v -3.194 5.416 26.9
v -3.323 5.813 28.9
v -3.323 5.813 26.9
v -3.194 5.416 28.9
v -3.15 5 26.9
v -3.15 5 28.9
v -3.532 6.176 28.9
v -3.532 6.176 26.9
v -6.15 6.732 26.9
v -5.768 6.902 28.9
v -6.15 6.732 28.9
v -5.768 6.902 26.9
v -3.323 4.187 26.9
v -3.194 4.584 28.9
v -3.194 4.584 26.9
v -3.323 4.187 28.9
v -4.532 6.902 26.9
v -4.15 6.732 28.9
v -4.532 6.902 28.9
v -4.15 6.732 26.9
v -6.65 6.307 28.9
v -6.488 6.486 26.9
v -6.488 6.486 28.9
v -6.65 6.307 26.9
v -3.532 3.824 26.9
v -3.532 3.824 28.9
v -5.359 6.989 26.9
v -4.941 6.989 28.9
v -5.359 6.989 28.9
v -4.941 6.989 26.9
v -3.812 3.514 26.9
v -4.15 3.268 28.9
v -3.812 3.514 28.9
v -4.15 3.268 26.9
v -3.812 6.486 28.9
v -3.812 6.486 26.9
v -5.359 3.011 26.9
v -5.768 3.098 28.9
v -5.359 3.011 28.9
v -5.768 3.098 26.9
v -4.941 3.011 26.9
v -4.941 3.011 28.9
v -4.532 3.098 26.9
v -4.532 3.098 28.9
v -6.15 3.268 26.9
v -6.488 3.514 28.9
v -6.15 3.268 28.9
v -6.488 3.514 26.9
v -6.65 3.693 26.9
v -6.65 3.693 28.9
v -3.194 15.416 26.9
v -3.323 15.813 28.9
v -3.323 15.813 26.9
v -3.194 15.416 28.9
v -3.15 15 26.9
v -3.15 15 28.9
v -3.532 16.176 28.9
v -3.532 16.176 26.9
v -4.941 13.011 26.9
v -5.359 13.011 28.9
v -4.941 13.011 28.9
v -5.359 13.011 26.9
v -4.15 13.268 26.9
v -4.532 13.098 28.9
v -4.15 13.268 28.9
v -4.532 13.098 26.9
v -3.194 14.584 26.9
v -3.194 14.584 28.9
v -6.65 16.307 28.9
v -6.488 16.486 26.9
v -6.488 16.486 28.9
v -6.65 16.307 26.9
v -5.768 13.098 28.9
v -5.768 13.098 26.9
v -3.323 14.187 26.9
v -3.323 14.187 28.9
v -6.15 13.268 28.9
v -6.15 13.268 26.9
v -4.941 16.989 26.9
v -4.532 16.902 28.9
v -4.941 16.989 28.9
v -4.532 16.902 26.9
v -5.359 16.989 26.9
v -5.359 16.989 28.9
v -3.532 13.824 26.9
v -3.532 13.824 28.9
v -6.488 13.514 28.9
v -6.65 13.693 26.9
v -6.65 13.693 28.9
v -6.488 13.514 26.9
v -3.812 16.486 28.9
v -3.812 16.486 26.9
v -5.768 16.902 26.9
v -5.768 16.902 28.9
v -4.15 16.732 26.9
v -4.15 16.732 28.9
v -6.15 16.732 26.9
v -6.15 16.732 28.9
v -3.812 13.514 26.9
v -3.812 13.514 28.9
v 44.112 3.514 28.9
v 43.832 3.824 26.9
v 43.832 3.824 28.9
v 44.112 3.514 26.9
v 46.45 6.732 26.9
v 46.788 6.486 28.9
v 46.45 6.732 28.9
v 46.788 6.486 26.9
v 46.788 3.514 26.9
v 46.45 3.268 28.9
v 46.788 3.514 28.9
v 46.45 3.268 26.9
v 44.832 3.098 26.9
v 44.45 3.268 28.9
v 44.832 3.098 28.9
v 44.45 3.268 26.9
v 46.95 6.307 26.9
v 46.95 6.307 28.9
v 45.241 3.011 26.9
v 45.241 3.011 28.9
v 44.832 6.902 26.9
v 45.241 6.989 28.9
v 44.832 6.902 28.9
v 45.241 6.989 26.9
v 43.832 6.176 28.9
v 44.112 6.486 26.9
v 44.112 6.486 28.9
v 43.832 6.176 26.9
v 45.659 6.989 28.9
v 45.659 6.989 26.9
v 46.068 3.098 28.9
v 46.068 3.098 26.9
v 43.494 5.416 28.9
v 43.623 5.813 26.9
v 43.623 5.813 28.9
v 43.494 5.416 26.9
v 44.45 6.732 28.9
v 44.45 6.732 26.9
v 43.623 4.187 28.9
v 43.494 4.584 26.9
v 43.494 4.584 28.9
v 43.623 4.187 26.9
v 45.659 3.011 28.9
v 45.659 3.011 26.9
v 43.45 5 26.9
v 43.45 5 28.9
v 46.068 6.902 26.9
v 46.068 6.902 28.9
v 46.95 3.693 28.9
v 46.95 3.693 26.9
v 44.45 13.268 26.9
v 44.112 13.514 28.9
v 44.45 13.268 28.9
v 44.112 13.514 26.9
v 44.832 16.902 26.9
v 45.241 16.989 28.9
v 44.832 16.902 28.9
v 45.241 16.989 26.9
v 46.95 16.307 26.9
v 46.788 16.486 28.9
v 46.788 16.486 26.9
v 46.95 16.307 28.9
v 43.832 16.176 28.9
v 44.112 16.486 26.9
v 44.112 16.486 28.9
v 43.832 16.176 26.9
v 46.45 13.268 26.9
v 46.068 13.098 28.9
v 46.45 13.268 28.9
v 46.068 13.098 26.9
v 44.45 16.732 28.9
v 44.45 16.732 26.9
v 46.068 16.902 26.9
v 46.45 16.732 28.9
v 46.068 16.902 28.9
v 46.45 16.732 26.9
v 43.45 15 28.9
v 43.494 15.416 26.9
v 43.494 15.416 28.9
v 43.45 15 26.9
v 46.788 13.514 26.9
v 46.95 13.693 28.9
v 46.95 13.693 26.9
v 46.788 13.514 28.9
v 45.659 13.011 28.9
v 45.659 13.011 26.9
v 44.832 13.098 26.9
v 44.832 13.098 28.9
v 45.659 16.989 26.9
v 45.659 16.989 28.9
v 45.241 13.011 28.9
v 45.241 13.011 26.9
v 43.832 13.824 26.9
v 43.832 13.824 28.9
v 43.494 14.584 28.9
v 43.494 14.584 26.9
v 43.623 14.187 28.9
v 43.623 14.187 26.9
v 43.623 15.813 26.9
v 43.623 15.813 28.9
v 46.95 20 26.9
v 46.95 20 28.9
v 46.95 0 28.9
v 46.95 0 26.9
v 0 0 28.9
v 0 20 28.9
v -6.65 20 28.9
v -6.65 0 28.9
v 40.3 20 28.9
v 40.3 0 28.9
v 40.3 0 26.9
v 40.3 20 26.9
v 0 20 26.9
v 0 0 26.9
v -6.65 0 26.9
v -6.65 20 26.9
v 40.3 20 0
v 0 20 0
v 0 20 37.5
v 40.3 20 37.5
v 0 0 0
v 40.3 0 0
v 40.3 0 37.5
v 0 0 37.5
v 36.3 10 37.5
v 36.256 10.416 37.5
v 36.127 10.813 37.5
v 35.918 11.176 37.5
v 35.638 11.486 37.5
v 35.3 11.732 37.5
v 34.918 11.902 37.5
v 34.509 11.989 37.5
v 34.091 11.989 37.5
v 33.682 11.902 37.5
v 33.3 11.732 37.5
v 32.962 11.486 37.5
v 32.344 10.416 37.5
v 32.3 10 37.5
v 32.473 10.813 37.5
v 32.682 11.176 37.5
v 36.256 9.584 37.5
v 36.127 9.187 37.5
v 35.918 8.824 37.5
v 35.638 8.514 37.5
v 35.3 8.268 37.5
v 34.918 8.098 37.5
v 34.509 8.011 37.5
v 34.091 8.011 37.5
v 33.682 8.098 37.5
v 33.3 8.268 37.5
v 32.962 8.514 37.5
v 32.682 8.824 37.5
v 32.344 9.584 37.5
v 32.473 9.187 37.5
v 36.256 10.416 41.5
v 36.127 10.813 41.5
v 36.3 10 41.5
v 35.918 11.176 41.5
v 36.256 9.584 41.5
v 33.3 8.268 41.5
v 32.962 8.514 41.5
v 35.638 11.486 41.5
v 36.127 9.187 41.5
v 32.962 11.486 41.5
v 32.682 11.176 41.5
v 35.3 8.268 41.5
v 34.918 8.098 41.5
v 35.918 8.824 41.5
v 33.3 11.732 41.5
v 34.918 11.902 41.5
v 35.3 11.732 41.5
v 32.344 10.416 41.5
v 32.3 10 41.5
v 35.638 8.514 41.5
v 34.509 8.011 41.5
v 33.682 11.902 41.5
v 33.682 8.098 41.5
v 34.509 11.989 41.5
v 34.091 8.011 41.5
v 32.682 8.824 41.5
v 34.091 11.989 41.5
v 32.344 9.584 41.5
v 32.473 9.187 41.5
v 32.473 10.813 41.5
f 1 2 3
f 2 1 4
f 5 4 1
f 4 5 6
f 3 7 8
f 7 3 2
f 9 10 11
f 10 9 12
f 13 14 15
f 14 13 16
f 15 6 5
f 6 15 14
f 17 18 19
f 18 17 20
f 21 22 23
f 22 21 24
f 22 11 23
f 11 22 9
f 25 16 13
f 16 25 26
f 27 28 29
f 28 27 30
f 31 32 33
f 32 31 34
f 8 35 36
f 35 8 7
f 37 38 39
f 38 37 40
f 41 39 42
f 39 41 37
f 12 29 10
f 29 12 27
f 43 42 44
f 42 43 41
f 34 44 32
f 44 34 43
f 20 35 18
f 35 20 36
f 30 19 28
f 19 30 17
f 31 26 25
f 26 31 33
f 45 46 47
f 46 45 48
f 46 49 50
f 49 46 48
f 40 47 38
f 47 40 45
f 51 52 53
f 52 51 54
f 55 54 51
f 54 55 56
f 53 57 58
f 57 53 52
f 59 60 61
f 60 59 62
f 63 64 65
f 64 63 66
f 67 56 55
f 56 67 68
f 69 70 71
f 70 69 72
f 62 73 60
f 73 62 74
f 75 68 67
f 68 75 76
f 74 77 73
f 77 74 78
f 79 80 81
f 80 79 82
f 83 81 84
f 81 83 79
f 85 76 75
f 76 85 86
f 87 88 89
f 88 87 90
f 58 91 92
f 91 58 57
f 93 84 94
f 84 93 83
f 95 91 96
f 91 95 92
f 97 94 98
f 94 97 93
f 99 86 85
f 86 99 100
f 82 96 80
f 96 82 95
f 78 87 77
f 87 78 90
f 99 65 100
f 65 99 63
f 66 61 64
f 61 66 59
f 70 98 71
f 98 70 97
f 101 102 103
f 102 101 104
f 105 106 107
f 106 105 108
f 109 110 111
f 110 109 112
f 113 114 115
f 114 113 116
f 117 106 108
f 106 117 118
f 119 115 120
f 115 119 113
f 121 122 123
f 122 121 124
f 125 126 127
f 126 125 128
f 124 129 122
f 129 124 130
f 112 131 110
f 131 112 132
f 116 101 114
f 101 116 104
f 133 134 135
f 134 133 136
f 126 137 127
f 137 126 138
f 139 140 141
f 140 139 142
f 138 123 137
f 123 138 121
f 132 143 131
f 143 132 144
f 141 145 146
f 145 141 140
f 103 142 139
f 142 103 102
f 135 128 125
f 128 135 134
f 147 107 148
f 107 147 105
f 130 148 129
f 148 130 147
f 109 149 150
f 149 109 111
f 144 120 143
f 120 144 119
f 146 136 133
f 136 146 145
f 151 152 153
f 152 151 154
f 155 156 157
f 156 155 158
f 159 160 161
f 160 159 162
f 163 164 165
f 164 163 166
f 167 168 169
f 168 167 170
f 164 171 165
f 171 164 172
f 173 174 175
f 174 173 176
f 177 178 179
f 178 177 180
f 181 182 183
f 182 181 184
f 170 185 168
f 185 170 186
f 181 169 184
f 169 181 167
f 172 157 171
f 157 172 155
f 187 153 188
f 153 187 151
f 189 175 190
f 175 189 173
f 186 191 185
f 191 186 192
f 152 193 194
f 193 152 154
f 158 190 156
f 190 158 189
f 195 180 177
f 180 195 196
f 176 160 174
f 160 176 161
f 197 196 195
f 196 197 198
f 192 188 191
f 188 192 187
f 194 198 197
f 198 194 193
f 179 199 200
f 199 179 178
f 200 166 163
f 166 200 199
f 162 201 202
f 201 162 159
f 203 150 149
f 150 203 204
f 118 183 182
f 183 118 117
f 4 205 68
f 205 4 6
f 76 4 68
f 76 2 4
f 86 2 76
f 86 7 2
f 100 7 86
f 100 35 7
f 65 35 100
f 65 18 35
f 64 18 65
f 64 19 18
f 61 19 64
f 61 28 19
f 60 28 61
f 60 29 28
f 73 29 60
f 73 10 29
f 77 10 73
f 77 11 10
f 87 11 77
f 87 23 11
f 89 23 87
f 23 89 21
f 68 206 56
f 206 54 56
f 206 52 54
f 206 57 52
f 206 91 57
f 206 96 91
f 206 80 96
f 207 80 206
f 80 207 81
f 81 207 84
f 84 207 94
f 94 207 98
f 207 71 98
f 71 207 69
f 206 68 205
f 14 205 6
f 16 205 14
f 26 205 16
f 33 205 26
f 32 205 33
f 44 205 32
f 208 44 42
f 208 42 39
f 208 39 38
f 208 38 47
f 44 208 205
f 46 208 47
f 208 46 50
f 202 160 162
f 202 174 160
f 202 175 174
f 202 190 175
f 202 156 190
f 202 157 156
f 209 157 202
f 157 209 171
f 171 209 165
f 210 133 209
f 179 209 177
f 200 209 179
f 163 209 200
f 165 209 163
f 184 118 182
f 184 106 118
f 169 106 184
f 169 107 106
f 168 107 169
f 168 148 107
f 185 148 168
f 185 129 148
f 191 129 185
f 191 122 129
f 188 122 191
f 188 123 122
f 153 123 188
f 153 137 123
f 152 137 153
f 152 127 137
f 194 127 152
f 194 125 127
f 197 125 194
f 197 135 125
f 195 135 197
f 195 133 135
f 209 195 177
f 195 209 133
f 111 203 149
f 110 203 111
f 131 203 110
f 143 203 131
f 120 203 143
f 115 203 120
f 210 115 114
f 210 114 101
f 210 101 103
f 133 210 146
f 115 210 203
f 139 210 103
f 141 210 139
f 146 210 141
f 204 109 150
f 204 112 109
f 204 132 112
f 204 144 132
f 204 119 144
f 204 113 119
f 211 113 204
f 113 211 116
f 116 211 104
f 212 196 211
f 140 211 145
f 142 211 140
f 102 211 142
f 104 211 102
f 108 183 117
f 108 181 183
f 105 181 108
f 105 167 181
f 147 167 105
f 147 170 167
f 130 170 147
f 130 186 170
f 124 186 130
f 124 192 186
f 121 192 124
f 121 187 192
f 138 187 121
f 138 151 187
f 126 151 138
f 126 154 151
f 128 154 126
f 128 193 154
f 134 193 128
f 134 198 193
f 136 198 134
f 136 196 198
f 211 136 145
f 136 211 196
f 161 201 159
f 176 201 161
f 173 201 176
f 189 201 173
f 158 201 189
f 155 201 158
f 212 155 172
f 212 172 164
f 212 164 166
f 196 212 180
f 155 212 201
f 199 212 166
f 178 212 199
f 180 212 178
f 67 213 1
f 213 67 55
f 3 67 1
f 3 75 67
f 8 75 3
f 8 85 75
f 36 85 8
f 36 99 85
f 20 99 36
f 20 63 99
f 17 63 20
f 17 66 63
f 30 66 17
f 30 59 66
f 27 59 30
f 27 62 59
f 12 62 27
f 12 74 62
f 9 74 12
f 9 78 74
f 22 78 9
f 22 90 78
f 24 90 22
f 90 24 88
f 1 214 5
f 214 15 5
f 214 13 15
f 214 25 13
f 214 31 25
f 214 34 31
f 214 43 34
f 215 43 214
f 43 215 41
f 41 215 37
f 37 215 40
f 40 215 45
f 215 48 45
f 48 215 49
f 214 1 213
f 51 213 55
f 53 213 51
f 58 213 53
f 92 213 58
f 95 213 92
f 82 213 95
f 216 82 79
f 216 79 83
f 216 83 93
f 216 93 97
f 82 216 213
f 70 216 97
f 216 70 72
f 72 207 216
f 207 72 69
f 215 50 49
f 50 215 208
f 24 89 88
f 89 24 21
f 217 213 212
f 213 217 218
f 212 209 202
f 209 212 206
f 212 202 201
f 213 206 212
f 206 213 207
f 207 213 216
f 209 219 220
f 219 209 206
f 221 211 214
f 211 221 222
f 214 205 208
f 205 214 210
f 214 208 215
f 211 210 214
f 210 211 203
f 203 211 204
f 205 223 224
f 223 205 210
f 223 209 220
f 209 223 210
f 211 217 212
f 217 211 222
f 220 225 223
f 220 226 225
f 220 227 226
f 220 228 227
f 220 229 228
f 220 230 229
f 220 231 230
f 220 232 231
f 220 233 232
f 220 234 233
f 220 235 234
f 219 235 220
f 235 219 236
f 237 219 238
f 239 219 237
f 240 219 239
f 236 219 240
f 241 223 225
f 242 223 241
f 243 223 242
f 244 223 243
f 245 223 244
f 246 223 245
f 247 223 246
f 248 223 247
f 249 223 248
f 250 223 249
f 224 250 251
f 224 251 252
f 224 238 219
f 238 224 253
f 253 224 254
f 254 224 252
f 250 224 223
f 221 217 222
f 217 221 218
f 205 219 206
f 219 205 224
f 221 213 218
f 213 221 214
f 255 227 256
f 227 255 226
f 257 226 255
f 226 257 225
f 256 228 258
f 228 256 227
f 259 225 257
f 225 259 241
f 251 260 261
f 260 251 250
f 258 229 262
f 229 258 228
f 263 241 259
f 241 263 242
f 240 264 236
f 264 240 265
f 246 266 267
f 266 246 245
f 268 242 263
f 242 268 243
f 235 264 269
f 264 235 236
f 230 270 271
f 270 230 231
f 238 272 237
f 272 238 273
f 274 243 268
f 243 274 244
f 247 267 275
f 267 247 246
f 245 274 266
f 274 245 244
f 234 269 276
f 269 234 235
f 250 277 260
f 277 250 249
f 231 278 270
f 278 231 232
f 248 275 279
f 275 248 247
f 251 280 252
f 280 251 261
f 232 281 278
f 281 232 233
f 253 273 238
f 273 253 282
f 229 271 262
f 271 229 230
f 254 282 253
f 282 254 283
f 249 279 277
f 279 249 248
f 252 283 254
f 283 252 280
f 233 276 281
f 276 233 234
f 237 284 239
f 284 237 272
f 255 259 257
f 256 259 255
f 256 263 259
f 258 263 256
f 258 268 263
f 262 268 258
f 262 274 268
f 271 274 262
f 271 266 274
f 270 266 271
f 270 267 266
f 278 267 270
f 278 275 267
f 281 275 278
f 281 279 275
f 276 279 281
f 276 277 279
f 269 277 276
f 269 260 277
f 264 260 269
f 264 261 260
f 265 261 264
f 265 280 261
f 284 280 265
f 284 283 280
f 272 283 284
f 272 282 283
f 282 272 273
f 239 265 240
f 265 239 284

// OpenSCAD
$fn = 30;

flange_width = 53.6;
flange_height_offset = 26.9;
flange_height = 2;
main_width = 40.3;
depth = 20;
height = 37.5;

	cube([main_width, depth, height]);
	translate([main_width/2-flange_width/2,0,flange_height_offset]) {
		difference() {
			cube([flange_width, depth, flange_height]);
			translate([0,depth/2,-2.5]) {
				translate([1.5,-5,0]) cylinder(d=4, h=5);
				translate([1.5,5,0]) cylinder(d=4, h=5);
				translate([flange_width - 1.5,-5,0]) cylinder(d=4, h=5);
				translate([flange_width - 1.5,5,0]) cylinder(d=4, h=5);
			}
		}
	}
translate([34.3, depth/2, height]) color("orange") cylinder(r=2, h=4);
